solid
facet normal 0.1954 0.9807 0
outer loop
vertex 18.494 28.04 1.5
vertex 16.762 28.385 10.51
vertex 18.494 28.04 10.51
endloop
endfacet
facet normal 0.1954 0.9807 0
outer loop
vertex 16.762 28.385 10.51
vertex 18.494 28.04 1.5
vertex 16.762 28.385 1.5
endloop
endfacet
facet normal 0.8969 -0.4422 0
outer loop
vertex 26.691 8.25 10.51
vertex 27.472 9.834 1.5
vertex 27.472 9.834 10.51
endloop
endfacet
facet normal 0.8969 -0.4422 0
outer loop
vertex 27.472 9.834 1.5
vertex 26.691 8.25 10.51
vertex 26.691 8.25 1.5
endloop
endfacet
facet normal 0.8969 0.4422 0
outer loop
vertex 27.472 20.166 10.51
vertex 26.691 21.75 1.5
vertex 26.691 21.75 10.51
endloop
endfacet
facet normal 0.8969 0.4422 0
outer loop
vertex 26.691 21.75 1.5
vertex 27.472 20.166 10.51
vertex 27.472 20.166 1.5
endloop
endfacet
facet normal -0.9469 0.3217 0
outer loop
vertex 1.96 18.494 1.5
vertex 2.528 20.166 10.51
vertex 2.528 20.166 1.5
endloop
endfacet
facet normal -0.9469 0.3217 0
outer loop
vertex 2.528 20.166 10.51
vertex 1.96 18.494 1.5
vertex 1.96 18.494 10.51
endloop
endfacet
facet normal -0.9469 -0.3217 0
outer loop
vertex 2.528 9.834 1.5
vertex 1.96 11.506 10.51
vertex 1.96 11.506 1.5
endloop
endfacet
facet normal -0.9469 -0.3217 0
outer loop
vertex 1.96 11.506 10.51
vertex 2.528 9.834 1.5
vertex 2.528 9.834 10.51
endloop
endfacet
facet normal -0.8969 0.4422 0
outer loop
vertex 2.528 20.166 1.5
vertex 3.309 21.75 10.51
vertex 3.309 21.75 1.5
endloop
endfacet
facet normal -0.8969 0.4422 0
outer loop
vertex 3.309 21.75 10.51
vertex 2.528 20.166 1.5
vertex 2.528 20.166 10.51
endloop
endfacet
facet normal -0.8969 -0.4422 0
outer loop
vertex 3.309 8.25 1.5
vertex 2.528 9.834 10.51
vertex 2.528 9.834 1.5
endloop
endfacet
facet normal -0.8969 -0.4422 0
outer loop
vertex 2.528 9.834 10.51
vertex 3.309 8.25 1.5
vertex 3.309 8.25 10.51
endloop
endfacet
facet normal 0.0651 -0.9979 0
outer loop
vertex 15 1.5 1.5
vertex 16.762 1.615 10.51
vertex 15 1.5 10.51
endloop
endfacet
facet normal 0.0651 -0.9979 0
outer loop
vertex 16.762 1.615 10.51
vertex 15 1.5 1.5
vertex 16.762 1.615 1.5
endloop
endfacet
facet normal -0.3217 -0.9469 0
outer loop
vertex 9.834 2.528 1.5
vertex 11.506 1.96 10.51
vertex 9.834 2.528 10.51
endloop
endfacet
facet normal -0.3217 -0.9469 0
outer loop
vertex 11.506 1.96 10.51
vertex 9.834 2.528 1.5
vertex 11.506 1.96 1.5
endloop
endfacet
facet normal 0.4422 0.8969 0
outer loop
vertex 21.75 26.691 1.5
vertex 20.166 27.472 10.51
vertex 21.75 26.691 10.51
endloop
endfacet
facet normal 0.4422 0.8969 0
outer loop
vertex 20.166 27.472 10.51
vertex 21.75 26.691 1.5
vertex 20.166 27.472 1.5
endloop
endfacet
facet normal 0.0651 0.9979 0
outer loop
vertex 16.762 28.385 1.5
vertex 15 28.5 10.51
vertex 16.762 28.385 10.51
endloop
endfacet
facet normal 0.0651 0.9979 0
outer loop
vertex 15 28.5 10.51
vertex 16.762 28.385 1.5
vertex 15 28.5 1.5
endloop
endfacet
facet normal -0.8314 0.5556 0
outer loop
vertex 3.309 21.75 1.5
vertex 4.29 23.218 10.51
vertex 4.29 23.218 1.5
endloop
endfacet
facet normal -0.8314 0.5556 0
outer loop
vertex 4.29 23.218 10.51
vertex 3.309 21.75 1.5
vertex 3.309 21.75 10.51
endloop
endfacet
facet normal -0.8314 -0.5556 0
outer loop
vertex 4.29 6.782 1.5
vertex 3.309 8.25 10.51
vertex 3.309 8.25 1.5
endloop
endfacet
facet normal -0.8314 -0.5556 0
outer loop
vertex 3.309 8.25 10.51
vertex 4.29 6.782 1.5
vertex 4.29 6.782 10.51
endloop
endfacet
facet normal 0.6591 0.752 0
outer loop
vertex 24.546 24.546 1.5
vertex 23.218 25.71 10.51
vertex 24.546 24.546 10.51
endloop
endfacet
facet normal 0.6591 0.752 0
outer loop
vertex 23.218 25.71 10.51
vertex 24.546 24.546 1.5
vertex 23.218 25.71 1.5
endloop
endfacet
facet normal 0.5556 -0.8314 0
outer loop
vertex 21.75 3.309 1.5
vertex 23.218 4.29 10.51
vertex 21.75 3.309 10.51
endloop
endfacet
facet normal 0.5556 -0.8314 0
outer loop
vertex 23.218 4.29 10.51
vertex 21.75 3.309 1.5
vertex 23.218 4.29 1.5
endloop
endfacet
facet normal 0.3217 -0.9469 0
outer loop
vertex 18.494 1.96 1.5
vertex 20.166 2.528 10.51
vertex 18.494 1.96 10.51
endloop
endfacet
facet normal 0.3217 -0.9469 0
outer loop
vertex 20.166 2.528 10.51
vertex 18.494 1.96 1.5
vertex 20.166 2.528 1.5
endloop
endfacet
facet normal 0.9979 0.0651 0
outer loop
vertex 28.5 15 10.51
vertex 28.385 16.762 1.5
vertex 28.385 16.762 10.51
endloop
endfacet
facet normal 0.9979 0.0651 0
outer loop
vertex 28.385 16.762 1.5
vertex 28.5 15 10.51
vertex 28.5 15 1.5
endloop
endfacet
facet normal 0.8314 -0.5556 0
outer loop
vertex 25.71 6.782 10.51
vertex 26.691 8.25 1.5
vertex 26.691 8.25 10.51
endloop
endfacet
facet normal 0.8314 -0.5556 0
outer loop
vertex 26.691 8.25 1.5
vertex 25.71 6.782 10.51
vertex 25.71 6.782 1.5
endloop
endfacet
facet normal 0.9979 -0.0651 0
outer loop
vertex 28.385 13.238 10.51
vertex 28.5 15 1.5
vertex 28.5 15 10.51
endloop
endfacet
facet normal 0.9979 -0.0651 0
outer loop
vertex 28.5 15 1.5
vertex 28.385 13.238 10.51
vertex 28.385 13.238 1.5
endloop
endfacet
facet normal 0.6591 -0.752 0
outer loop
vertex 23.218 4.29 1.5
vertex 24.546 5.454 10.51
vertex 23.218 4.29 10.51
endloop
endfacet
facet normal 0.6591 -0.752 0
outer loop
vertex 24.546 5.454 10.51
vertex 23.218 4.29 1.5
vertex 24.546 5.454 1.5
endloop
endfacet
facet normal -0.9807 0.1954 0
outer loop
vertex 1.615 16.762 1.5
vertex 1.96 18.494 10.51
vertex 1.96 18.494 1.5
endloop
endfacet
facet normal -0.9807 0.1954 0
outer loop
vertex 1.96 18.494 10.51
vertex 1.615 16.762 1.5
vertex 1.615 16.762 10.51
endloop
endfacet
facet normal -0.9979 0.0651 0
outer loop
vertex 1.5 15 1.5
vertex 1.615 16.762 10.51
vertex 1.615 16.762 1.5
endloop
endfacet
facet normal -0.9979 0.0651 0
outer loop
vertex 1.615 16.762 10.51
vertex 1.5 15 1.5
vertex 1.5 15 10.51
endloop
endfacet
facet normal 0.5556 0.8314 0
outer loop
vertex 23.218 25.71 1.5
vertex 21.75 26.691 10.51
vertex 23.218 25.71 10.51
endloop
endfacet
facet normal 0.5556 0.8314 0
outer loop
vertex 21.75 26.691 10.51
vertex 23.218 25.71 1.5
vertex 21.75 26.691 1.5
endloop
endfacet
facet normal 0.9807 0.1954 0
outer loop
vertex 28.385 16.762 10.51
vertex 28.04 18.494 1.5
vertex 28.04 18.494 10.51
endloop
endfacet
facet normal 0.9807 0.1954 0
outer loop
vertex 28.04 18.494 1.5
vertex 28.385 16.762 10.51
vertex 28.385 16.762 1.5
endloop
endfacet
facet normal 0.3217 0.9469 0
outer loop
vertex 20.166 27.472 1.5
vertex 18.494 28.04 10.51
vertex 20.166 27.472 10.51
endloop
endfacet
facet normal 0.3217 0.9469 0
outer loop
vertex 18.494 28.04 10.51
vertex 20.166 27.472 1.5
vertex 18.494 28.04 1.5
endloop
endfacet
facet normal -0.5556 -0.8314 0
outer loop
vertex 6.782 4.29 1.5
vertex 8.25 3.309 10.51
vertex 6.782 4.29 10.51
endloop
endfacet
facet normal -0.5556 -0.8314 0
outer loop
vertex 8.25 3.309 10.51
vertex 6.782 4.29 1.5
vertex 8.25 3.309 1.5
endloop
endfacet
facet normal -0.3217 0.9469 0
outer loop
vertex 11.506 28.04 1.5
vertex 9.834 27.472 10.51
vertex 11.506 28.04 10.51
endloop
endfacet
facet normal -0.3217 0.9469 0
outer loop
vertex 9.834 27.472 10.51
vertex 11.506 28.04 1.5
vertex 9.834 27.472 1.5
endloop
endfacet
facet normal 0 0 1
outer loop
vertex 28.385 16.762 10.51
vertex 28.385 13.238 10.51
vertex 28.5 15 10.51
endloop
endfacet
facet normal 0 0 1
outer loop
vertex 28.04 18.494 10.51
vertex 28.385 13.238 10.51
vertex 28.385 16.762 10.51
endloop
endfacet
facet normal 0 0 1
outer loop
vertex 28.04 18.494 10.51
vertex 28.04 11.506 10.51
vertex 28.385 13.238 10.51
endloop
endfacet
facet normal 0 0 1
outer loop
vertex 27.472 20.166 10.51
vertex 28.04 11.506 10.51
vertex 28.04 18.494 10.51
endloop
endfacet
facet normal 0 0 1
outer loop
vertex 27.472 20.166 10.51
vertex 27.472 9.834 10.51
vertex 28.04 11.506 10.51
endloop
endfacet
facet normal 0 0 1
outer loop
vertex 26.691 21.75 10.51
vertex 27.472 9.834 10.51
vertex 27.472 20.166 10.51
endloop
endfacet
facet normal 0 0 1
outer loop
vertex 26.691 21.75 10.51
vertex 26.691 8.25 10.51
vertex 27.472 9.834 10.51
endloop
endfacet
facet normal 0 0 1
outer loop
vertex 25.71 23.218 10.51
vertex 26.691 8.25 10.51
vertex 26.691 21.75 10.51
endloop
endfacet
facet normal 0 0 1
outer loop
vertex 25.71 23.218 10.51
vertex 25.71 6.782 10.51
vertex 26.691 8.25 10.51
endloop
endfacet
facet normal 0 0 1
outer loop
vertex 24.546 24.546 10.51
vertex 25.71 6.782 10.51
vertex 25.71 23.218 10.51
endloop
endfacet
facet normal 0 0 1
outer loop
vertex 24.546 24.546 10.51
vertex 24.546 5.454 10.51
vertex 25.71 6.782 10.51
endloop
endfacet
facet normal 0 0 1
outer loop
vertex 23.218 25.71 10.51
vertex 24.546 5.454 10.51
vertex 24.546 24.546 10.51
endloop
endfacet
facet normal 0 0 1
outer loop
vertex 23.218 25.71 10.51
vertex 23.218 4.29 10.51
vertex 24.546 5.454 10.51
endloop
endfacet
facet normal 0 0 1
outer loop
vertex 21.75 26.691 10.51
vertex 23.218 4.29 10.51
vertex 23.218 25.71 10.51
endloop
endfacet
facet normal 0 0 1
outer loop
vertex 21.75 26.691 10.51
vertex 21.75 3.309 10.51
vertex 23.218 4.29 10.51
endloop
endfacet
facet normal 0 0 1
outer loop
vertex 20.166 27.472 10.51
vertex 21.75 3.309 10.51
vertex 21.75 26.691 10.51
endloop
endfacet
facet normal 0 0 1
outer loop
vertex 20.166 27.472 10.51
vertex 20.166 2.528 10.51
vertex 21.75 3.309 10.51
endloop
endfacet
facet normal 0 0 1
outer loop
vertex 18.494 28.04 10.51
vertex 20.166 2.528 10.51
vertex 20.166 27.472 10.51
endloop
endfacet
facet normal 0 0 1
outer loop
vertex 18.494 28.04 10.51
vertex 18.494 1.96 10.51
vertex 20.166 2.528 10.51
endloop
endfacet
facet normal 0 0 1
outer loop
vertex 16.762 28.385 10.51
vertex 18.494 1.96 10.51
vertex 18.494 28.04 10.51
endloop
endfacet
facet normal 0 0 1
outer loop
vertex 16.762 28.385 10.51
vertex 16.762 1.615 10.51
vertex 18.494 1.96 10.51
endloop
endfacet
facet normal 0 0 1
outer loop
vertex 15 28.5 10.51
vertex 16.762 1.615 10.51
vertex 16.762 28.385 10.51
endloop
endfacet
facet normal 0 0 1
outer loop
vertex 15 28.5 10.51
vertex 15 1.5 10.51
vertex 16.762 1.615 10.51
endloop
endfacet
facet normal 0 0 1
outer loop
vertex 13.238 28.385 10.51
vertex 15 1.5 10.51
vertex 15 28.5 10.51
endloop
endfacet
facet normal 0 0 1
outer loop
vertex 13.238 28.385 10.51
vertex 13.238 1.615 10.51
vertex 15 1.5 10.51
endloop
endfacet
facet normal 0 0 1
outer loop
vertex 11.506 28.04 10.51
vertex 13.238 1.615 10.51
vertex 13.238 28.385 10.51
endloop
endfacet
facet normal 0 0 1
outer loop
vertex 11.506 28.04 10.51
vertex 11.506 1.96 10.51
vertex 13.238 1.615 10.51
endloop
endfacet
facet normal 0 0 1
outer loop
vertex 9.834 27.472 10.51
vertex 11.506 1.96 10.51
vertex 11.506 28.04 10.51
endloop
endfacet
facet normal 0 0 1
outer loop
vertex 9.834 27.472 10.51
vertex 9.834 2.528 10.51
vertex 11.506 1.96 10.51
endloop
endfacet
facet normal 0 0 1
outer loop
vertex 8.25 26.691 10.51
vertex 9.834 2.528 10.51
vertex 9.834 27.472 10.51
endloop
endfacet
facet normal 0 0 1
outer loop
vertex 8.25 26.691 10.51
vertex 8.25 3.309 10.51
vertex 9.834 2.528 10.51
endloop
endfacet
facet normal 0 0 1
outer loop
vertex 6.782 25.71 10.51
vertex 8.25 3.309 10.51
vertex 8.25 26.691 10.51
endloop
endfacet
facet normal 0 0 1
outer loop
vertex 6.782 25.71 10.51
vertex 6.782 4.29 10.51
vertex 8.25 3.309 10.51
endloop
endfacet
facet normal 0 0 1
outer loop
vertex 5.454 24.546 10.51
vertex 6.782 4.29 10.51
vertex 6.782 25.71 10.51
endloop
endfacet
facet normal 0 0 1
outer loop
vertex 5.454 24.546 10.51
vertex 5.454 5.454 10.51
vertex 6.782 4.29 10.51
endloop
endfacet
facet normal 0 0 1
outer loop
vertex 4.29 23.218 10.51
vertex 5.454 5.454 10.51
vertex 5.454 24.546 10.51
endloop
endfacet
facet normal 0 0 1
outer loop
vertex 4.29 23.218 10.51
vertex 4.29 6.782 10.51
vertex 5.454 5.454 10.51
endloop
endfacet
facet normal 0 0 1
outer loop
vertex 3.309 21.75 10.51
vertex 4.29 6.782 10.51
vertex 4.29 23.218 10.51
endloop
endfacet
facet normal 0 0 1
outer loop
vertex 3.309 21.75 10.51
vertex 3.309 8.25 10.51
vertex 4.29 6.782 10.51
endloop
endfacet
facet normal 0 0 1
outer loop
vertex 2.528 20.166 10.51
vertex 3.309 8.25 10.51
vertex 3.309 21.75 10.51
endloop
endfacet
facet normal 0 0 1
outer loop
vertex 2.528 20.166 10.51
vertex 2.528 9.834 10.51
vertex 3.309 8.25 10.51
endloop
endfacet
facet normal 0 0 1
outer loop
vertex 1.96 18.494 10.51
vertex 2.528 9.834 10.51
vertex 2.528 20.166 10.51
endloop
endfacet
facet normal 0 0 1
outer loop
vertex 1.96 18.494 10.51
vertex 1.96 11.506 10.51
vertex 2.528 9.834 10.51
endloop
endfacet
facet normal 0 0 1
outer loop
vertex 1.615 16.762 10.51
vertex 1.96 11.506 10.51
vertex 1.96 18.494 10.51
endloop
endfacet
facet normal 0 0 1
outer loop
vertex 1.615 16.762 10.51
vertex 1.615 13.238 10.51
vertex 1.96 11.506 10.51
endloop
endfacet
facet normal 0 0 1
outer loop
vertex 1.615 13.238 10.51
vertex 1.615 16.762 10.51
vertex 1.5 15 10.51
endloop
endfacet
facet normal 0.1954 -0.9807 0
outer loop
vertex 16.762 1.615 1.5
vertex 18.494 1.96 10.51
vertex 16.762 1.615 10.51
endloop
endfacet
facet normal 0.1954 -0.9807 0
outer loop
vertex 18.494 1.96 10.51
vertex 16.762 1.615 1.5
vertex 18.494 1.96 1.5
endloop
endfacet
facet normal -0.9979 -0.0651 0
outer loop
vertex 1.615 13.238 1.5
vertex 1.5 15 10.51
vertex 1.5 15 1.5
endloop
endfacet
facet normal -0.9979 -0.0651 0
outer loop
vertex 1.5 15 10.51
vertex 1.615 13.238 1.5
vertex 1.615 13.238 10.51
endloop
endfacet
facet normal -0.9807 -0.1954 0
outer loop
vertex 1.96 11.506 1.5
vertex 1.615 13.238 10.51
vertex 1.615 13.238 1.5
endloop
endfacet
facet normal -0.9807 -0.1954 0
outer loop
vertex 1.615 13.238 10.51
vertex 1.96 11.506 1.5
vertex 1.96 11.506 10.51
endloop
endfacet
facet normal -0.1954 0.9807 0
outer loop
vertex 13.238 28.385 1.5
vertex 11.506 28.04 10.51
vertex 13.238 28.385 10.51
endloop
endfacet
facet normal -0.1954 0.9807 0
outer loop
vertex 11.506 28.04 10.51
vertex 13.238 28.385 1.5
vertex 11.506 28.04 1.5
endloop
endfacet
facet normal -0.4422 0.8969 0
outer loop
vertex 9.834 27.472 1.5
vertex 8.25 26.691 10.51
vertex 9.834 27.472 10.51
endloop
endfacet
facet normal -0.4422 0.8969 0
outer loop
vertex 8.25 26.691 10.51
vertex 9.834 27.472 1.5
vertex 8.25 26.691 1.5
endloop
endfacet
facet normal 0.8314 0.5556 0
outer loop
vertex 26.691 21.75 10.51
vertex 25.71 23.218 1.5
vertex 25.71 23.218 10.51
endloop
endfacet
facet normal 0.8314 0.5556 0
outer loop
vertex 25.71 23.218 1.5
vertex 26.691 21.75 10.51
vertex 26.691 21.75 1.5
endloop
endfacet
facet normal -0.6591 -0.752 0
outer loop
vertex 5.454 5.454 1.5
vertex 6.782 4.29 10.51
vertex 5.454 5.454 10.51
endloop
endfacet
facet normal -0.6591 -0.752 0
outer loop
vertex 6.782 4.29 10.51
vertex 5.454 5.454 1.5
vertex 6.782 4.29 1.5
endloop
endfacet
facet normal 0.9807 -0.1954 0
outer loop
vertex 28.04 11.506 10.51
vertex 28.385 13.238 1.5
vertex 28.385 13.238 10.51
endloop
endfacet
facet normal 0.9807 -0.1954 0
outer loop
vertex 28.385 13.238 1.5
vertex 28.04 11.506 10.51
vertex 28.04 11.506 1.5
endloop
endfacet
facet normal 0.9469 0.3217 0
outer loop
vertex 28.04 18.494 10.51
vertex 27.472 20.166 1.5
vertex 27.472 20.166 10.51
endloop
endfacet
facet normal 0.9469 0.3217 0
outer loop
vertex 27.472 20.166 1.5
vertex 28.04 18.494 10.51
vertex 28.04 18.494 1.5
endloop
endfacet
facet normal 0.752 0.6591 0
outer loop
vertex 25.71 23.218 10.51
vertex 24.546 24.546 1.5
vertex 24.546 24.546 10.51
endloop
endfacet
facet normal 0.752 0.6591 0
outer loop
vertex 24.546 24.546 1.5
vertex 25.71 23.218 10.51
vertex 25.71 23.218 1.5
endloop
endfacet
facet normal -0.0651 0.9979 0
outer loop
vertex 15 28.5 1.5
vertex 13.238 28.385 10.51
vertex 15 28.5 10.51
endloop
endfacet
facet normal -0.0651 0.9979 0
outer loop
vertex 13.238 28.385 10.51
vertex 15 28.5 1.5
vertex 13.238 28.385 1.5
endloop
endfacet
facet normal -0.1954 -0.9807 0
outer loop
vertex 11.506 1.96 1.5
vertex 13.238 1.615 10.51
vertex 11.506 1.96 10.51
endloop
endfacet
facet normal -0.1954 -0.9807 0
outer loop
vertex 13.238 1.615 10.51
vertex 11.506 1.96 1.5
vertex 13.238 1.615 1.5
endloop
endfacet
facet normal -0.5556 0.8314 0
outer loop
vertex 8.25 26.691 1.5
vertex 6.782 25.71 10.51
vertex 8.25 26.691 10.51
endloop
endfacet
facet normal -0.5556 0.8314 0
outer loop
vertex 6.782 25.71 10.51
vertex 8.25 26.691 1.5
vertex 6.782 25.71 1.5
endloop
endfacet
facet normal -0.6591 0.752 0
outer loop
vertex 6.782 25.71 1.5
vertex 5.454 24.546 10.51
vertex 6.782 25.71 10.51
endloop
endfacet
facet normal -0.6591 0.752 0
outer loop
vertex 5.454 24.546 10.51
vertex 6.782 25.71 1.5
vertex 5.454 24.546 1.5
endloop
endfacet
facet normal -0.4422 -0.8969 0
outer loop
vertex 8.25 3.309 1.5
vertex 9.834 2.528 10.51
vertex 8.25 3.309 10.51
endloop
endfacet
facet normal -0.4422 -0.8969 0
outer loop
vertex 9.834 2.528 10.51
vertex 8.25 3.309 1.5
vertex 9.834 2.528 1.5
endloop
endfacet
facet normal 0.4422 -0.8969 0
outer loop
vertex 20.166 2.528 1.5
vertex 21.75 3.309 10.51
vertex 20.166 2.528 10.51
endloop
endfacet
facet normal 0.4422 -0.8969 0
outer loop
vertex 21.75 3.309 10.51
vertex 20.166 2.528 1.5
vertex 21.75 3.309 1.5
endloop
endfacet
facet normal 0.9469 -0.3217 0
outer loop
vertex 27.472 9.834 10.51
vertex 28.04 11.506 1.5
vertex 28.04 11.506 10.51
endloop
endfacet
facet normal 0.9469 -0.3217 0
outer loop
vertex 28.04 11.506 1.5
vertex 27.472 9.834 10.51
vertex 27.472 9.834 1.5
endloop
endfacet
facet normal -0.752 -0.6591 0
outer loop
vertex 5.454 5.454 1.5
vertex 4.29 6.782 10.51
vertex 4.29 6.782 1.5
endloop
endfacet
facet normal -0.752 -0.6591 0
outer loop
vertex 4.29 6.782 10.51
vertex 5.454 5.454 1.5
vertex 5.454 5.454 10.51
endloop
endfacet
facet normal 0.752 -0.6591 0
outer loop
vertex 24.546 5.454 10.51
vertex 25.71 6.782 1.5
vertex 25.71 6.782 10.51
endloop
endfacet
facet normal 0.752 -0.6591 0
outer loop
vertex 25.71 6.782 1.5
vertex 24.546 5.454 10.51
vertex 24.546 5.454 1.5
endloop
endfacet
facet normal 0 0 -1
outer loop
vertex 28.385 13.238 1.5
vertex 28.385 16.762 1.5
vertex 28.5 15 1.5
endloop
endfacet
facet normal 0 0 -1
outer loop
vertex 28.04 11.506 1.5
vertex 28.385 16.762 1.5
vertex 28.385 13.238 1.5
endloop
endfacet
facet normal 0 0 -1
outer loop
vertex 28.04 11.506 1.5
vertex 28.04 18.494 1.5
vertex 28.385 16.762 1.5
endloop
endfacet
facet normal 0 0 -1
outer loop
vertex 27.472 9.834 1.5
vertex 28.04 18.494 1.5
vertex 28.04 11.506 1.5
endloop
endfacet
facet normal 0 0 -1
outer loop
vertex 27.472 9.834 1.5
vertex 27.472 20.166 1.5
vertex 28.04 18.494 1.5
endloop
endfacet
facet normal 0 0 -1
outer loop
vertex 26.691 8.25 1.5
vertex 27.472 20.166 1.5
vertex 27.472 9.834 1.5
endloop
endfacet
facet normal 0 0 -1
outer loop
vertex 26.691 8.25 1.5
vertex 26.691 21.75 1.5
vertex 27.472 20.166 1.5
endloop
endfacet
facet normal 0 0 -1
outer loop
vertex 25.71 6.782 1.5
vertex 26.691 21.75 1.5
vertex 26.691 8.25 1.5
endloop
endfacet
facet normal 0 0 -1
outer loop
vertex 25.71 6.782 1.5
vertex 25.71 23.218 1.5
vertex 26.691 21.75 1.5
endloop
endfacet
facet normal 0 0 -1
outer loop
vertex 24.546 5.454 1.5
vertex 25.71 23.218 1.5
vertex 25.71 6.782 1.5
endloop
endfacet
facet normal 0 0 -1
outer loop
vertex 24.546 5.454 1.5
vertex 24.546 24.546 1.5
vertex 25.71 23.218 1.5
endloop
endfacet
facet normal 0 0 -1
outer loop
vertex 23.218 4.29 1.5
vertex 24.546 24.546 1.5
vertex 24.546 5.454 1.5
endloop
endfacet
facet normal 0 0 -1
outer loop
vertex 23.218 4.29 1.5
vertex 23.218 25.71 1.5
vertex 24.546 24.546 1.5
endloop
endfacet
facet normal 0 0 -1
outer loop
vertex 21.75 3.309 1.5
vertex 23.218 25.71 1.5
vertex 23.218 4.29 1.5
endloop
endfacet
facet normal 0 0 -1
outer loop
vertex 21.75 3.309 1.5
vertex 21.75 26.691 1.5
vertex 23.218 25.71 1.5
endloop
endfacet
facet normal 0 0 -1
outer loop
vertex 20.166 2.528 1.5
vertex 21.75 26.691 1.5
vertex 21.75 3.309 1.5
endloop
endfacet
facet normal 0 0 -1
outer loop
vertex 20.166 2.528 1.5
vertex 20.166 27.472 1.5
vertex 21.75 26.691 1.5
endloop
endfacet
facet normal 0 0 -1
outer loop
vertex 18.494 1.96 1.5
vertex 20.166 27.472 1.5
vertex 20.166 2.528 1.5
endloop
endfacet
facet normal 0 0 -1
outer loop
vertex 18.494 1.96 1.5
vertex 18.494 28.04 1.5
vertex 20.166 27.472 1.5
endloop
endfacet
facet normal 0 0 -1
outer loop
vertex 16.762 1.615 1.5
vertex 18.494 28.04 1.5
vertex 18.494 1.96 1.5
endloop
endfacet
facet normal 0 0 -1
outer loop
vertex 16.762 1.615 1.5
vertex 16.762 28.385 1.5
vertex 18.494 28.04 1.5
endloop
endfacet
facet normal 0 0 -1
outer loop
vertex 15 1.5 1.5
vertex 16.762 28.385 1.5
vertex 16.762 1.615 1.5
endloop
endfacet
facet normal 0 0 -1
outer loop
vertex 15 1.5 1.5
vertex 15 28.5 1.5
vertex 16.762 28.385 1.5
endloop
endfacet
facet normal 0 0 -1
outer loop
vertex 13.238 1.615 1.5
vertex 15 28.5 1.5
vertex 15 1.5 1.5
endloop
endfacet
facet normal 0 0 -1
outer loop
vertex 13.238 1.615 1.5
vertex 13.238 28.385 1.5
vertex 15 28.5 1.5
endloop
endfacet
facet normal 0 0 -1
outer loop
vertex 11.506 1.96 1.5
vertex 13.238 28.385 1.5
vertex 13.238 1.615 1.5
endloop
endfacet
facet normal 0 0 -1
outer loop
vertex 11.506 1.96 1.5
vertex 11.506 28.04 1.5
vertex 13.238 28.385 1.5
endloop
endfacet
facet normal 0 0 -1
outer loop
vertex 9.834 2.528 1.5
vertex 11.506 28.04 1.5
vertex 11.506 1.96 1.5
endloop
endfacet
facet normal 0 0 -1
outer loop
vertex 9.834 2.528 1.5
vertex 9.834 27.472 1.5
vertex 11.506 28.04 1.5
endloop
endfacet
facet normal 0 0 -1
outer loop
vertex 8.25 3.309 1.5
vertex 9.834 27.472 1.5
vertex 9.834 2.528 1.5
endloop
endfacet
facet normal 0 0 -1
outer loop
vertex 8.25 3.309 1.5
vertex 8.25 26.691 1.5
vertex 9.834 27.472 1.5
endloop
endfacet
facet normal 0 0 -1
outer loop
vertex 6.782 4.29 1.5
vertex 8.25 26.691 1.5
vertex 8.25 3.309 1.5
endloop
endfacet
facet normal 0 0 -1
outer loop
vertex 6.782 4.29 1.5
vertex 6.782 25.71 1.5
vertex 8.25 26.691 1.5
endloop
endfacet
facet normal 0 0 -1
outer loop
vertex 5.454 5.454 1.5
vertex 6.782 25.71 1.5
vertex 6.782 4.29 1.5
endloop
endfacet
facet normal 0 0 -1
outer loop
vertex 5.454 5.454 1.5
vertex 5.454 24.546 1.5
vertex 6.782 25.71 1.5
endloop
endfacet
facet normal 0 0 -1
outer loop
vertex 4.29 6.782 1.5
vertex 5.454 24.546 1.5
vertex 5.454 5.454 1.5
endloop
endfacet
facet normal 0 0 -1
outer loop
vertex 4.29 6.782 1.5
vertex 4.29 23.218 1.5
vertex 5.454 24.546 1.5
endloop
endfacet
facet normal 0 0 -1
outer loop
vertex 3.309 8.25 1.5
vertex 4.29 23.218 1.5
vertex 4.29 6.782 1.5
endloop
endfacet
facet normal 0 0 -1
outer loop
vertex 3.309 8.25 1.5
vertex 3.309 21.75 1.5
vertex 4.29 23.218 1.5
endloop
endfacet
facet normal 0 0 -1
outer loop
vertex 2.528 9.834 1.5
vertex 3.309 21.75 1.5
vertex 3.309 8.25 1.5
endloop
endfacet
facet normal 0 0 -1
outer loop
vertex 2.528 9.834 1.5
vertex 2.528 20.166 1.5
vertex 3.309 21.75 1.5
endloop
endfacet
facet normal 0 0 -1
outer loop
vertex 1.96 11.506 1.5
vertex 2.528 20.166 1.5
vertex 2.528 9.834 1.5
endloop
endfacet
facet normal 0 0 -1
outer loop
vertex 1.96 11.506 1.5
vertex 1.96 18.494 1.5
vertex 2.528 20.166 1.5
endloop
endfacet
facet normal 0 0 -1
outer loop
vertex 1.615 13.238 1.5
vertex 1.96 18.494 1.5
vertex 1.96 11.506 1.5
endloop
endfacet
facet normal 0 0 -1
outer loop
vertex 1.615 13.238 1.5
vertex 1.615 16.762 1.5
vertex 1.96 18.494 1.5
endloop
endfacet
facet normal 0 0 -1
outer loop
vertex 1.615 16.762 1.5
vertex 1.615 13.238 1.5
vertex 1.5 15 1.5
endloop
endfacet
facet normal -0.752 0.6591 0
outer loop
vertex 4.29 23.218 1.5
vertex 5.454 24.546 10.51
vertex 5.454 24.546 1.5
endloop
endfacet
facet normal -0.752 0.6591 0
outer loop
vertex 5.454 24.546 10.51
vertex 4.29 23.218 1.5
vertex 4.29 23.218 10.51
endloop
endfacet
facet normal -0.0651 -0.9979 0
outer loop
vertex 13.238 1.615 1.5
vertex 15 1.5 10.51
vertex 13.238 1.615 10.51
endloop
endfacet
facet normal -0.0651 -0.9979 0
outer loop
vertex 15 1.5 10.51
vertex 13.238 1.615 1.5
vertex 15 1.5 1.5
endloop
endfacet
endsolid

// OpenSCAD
// units=mm — generated by scad_emitter.py
// part=unnamed
$fn = 48;

intersection() { translate([15, 15, 0]) cylinder(h=12, r=15, $fn=$fn); hull() { translate([15,15,1.5]) cylinder(h=0.01,r=13.5,$fn=$fn); translate([15,15,10.5]) cylinder(h=0.01,r=13.5,$fn=$fn); } }
